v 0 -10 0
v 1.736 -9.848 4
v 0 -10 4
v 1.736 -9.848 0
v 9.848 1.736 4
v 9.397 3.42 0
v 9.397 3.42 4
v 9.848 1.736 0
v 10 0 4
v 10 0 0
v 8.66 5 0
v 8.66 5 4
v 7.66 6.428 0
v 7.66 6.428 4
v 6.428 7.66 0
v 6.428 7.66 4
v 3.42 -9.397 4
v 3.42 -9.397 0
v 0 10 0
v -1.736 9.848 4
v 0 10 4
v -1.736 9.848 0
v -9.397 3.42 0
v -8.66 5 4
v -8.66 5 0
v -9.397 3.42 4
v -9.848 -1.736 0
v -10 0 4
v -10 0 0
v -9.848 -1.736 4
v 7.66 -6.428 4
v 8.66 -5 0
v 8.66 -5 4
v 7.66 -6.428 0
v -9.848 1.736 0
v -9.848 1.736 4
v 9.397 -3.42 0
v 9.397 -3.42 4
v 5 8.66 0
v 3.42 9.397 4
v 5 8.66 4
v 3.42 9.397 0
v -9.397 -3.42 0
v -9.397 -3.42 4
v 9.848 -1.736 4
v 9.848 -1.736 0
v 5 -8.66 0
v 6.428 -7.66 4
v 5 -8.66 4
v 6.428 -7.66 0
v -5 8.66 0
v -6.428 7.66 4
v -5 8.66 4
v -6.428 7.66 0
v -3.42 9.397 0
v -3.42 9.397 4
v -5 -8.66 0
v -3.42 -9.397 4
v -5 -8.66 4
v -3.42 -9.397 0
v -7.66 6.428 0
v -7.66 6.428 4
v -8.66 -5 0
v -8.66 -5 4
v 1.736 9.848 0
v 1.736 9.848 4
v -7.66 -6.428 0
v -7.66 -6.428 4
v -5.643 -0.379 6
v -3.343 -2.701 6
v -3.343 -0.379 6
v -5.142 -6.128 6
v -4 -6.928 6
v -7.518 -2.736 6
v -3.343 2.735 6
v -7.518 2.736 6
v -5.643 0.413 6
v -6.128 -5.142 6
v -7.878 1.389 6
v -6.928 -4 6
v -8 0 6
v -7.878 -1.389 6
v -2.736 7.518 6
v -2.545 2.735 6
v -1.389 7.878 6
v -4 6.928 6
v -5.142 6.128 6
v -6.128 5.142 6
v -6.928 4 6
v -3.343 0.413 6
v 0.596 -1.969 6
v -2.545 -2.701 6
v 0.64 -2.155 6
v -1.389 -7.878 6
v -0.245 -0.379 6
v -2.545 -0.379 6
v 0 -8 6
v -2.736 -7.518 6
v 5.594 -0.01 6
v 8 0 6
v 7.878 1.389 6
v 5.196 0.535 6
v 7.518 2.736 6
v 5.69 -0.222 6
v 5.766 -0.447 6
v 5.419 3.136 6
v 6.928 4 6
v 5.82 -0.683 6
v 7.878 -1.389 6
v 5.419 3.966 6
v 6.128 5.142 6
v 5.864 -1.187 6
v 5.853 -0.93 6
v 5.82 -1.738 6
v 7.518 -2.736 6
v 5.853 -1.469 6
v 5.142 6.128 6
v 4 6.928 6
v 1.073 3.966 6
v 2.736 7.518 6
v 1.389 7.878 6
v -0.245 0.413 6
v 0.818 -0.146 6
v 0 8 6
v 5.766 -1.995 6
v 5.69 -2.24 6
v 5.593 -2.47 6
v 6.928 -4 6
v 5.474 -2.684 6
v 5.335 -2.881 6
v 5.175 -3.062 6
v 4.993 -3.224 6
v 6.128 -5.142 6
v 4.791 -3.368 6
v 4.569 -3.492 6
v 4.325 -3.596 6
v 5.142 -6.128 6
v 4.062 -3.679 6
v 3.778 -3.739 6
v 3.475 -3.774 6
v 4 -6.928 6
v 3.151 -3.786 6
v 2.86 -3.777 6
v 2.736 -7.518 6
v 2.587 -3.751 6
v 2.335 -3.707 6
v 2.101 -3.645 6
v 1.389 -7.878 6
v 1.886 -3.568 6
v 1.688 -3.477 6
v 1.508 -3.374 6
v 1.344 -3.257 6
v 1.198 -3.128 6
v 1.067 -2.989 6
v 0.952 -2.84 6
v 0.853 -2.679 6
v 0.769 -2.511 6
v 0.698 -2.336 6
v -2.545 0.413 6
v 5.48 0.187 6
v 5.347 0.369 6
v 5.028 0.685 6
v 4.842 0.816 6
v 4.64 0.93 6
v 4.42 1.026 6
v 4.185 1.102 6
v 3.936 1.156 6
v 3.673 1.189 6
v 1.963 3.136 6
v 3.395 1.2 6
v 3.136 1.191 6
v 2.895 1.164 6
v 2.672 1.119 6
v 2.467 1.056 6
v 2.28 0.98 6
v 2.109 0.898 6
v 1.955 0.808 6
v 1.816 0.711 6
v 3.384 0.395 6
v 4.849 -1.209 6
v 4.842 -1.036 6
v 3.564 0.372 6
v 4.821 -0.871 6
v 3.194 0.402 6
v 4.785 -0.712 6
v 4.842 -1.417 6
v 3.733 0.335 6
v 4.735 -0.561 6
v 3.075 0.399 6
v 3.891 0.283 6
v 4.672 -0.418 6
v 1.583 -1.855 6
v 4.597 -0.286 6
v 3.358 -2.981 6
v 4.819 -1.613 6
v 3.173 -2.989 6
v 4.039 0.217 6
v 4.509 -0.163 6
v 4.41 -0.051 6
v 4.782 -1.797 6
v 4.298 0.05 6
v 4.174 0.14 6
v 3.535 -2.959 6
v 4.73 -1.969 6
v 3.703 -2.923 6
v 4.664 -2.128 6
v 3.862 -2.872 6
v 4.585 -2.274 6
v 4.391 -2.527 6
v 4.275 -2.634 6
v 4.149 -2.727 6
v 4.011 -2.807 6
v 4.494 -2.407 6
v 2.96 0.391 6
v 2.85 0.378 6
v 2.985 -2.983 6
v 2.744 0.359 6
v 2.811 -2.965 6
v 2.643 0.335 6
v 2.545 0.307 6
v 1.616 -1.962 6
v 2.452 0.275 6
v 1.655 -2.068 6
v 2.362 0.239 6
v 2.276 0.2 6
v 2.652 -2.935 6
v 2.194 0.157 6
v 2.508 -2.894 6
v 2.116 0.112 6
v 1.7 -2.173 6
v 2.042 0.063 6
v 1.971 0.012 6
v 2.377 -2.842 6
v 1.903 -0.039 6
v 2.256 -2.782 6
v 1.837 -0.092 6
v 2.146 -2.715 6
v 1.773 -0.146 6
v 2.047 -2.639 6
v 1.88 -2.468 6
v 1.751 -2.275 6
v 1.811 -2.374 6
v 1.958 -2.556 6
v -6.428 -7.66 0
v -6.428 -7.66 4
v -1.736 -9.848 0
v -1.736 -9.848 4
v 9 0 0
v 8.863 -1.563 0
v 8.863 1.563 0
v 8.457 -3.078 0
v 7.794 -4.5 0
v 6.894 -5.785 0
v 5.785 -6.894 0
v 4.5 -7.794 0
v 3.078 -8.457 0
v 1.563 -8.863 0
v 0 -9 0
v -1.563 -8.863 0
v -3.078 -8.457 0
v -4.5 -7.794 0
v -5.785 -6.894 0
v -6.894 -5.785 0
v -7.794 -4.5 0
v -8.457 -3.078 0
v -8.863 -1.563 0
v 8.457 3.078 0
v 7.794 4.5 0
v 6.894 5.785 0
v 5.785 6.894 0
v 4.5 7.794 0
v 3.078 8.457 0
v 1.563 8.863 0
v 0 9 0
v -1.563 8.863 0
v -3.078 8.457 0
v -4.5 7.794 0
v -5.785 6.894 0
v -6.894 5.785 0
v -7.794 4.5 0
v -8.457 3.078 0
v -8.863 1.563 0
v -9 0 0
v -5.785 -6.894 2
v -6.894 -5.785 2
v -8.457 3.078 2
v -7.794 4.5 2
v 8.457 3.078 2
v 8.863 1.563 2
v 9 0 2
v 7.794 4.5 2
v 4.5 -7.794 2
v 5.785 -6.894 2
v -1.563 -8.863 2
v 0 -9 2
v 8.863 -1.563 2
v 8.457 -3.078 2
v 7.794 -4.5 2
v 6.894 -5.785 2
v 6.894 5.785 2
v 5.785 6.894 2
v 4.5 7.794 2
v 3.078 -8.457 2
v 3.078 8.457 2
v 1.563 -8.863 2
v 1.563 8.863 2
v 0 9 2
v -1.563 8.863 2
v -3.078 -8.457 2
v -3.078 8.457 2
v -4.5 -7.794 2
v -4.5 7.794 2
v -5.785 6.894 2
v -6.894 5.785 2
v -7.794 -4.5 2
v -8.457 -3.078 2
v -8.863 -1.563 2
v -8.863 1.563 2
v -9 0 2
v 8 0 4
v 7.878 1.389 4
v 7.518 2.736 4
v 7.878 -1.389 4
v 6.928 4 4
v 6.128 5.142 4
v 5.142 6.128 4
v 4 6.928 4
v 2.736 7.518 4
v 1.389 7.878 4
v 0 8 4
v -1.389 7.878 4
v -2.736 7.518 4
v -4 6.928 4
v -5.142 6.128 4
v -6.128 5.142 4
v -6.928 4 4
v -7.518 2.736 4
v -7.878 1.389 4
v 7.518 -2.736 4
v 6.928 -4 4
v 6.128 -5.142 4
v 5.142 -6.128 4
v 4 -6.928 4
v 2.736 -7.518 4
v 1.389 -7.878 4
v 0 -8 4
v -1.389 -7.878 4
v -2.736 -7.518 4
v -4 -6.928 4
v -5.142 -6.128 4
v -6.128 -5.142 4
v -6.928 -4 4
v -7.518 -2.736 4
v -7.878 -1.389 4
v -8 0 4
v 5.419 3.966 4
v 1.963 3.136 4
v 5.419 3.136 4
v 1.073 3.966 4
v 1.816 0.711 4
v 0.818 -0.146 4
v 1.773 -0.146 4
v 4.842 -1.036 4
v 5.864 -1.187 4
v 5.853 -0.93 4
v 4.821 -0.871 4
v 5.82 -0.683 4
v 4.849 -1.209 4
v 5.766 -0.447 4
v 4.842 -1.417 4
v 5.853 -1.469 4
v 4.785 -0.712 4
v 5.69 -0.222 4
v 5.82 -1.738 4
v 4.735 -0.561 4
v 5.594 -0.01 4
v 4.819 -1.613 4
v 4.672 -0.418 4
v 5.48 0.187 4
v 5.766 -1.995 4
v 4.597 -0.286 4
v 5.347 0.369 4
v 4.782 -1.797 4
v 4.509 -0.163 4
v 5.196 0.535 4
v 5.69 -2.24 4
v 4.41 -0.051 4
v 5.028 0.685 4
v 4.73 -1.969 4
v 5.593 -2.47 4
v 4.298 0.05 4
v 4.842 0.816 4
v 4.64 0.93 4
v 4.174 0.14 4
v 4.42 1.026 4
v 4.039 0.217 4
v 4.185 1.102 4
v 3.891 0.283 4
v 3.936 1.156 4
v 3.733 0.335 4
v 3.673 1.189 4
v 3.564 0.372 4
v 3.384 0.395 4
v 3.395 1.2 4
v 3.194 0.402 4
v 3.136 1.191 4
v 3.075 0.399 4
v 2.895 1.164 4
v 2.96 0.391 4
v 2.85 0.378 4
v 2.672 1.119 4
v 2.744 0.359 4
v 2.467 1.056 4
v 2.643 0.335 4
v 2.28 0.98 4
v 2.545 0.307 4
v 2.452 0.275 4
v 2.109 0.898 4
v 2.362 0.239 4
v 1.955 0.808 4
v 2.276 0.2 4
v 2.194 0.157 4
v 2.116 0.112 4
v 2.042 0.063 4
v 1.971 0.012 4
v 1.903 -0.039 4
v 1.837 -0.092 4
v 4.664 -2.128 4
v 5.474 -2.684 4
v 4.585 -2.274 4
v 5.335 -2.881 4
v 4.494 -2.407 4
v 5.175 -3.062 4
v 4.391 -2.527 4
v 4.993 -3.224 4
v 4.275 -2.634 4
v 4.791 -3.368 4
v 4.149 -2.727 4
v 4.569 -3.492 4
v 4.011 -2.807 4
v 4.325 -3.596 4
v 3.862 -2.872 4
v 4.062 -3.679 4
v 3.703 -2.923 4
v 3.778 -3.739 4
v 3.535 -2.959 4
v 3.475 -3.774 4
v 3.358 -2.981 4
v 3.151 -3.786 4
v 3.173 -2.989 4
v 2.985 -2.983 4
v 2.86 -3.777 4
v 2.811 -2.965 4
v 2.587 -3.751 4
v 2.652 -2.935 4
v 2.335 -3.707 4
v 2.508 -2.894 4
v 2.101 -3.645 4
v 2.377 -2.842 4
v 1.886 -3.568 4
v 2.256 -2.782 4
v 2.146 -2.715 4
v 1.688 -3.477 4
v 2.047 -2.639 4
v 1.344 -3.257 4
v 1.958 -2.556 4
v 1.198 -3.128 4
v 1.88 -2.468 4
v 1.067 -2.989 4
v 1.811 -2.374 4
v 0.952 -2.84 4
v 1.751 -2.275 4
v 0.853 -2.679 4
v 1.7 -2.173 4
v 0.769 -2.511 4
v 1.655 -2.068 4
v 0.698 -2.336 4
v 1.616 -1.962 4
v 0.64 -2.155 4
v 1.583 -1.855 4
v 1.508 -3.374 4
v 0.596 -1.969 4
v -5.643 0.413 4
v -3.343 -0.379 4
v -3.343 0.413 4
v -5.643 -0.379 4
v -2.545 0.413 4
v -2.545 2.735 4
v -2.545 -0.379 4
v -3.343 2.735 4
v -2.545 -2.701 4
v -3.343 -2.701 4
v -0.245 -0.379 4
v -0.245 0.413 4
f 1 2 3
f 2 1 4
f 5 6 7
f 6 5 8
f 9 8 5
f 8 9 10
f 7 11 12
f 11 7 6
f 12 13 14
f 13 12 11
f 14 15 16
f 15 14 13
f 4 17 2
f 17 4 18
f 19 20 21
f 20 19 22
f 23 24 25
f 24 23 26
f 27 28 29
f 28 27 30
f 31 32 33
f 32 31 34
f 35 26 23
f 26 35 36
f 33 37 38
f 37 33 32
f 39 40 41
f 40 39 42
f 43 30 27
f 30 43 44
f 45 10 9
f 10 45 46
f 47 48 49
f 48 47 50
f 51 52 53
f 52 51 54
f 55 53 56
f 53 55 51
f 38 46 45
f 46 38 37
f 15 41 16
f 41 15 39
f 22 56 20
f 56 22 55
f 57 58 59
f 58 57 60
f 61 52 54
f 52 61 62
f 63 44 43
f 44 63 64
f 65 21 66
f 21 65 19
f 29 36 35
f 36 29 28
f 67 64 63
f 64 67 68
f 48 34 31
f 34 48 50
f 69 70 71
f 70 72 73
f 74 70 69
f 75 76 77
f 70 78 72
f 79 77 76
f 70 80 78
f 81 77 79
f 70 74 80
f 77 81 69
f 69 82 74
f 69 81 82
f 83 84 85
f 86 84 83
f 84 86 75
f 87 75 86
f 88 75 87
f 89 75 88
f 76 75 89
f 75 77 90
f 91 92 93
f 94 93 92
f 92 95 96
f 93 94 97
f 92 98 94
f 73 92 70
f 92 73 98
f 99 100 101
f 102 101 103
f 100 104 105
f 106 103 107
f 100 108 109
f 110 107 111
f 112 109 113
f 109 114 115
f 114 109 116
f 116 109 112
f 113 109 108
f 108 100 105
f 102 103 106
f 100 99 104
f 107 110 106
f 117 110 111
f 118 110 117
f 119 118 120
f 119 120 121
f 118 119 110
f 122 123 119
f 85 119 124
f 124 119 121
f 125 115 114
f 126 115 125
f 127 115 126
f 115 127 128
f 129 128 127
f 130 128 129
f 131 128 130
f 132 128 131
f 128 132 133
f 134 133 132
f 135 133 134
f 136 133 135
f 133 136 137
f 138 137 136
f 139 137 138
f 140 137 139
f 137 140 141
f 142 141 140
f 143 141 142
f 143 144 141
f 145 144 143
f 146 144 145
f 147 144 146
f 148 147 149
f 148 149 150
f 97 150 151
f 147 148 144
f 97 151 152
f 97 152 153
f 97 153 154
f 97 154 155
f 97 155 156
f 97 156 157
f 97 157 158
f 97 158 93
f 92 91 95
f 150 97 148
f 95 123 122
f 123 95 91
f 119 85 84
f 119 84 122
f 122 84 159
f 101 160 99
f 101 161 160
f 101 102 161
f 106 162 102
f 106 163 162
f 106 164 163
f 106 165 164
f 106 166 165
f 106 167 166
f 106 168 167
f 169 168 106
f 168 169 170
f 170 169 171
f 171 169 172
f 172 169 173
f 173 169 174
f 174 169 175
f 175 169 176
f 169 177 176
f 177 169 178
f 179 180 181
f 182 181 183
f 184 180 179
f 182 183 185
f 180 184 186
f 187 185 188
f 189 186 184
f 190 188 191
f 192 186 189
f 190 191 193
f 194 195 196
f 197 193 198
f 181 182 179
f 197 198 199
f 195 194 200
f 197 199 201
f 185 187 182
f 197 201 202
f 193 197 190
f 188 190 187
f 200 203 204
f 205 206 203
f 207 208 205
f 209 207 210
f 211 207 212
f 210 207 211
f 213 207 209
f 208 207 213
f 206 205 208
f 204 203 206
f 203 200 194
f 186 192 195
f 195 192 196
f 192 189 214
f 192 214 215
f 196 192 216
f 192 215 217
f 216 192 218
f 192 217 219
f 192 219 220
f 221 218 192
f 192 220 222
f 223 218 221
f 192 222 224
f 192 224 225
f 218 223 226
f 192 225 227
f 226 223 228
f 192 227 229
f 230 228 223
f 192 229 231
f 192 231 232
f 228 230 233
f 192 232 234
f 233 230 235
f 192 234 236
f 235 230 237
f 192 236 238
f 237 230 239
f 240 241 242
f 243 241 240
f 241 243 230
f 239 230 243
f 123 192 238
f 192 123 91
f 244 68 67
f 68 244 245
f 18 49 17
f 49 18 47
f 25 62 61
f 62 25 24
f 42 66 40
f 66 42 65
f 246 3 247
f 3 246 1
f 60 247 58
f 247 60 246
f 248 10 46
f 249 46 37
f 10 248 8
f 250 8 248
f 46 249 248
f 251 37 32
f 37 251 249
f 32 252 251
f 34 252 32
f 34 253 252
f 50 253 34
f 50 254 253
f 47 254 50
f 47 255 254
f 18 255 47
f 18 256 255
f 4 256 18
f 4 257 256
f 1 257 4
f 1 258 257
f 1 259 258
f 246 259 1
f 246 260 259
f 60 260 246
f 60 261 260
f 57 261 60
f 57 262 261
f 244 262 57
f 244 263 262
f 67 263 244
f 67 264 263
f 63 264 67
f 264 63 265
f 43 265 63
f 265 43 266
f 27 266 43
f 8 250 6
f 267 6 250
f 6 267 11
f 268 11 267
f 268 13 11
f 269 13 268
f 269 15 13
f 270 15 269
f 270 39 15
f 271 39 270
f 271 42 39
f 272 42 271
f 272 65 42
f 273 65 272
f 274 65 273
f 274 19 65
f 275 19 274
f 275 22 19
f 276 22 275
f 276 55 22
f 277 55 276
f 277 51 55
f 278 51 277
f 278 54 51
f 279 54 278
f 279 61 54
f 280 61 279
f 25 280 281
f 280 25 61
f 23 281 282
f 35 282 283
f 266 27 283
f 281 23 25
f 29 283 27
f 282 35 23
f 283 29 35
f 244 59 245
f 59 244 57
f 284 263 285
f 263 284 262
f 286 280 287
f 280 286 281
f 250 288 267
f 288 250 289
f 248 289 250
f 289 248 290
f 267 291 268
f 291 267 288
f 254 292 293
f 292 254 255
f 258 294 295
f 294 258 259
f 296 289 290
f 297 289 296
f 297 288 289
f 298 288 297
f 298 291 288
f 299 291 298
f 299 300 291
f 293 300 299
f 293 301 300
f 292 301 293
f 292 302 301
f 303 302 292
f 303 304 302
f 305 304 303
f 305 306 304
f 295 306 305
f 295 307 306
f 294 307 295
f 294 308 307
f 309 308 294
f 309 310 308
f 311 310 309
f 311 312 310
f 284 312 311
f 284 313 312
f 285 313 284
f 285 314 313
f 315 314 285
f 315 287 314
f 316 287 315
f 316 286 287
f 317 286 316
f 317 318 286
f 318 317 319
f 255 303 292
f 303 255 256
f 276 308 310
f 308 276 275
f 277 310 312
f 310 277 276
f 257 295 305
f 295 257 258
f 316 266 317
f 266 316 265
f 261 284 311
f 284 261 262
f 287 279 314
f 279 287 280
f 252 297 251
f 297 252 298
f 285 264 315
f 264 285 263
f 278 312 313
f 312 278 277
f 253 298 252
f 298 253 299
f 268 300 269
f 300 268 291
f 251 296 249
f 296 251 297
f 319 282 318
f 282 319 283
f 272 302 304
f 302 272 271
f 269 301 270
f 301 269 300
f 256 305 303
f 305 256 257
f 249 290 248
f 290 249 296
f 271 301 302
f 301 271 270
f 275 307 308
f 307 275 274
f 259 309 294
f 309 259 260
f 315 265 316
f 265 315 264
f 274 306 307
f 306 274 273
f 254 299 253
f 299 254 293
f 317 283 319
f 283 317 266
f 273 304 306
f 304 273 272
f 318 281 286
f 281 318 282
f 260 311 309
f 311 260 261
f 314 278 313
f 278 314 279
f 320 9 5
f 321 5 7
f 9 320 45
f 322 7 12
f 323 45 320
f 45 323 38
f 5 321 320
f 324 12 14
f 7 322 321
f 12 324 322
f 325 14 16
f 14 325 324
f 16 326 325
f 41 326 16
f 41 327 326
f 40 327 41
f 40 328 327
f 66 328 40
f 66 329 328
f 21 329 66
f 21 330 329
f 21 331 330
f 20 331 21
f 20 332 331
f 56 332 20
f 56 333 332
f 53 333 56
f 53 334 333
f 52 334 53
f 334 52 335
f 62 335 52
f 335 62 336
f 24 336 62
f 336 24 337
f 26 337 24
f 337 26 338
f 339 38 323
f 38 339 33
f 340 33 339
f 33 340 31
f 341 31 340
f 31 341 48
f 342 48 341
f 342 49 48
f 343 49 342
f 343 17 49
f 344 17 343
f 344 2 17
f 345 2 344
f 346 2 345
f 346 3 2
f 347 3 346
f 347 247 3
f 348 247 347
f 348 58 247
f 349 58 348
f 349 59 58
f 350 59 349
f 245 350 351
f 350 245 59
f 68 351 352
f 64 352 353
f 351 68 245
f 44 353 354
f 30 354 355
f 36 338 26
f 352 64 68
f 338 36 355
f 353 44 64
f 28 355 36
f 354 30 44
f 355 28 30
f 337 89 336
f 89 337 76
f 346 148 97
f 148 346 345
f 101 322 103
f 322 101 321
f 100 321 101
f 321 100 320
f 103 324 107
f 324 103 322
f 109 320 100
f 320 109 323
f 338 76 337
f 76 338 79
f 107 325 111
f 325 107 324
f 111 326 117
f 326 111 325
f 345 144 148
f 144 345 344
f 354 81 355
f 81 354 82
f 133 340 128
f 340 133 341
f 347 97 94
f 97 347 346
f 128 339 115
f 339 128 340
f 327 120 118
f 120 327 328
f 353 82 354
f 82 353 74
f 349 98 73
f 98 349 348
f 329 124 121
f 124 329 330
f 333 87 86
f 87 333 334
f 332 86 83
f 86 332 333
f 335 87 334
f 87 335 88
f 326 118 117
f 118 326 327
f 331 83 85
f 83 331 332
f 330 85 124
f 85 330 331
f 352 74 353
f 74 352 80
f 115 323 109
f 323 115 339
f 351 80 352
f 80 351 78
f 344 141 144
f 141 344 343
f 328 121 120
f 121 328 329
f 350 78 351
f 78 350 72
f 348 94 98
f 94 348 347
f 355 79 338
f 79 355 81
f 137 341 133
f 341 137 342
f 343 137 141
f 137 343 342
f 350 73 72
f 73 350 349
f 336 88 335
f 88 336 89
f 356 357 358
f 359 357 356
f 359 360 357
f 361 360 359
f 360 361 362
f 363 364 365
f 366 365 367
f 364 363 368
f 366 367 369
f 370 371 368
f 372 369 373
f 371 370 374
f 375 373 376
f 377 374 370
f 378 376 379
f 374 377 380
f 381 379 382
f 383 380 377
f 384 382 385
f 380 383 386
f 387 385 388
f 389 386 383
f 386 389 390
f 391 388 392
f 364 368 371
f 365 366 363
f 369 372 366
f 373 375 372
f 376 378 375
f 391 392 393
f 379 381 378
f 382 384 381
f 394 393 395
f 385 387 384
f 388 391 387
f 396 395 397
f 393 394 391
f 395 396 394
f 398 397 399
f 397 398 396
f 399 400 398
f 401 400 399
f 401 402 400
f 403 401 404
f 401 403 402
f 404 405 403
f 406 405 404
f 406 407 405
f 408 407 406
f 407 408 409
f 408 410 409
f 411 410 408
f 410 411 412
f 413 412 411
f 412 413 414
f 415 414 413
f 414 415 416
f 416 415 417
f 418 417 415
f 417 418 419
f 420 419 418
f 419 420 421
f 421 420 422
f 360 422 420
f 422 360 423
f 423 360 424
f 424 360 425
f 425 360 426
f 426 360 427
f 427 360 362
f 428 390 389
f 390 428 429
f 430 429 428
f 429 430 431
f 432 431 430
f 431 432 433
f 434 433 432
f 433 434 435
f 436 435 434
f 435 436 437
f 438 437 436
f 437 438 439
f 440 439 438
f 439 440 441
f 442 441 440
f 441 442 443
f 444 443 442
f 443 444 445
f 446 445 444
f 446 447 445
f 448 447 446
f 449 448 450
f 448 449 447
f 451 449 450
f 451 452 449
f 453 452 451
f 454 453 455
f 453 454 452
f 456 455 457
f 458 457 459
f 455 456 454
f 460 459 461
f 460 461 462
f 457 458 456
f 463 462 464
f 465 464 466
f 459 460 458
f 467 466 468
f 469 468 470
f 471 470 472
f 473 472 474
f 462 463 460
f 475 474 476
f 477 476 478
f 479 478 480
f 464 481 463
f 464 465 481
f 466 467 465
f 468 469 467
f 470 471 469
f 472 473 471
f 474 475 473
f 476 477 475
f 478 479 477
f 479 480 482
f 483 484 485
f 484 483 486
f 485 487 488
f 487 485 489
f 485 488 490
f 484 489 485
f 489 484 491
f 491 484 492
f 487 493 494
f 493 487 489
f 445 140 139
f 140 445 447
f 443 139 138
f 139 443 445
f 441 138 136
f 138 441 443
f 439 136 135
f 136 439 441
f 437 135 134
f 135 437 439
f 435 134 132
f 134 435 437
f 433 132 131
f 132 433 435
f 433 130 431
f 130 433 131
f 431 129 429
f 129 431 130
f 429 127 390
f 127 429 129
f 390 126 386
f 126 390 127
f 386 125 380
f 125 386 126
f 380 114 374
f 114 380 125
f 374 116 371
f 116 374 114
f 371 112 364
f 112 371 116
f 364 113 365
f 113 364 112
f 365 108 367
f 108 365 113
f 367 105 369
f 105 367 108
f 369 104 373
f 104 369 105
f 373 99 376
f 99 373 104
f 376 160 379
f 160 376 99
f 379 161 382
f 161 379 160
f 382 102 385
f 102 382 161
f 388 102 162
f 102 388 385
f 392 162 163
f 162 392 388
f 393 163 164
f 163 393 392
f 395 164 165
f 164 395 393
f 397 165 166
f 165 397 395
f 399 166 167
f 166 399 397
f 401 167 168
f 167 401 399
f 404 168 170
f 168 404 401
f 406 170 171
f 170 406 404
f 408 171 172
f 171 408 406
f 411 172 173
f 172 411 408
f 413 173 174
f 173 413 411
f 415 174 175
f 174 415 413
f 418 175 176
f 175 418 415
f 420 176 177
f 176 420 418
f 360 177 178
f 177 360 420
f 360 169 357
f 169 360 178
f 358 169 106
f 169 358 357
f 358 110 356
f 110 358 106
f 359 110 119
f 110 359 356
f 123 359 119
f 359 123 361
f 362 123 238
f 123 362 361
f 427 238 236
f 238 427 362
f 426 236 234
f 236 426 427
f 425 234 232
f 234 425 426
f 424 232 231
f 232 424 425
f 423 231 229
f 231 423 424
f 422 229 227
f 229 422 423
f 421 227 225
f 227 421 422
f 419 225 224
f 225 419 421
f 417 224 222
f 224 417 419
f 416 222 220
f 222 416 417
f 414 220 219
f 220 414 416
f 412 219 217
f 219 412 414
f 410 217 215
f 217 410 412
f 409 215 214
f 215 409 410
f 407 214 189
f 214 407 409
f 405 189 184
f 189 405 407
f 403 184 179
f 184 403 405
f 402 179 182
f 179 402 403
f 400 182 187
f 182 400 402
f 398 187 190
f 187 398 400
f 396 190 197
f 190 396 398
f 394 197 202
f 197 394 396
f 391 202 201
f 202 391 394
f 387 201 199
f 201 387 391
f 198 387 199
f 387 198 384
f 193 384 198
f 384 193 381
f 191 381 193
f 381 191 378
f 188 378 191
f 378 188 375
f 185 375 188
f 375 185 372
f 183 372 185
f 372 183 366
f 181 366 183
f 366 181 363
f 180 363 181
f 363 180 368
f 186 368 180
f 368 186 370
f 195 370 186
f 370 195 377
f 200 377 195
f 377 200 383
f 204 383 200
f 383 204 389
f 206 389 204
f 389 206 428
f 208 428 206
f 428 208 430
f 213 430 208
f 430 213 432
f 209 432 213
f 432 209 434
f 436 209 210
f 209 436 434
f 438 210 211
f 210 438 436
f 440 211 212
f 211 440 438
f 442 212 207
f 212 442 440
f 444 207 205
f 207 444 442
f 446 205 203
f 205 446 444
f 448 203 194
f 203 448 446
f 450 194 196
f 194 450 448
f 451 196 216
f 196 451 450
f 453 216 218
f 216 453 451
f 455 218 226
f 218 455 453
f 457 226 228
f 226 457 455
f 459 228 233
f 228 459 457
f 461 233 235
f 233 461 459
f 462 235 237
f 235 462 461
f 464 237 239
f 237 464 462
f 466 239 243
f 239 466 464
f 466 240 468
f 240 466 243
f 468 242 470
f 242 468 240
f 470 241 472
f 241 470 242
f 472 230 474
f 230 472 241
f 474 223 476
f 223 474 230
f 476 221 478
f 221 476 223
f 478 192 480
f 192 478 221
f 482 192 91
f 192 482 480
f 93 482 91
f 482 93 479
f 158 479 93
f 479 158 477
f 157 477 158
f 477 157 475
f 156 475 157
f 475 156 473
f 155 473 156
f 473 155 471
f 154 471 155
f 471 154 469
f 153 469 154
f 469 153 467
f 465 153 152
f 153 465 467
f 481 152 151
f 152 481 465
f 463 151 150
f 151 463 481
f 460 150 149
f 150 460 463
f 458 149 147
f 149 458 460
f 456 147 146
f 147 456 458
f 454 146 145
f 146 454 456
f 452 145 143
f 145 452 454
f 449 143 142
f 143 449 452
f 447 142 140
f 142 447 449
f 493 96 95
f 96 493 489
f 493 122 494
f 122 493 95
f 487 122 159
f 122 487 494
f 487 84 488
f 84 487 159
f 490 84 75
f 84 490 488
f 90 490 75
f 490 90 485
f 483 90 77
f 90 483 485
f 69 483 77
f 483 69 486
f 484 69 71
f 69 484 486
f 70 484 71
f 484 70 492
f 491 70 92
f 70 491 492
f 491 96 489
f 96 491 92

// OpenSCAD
difference() {
	difference() {
		difference() {
			cylinder($fn = 36, h = 6, r = 10);
			translate(v = [0, 0, -1]) {
				cylinder($fn = 36, h = 3, r = 9);
			}
		}
		translate(v = [0, 0, 4]) {
			difference() {
				cylinder($fn = 36, h = 3, r = 10.5000000000);
				cylinder($fn = 36, h = 3, r = 8);
			}
		}
	}
	translate(v = [0, 0, 4]) {
		linear_extrude(height = 3) {
			text(halign = "center", size = 8, text = "+5", valign = "center");
		}
	}
}
